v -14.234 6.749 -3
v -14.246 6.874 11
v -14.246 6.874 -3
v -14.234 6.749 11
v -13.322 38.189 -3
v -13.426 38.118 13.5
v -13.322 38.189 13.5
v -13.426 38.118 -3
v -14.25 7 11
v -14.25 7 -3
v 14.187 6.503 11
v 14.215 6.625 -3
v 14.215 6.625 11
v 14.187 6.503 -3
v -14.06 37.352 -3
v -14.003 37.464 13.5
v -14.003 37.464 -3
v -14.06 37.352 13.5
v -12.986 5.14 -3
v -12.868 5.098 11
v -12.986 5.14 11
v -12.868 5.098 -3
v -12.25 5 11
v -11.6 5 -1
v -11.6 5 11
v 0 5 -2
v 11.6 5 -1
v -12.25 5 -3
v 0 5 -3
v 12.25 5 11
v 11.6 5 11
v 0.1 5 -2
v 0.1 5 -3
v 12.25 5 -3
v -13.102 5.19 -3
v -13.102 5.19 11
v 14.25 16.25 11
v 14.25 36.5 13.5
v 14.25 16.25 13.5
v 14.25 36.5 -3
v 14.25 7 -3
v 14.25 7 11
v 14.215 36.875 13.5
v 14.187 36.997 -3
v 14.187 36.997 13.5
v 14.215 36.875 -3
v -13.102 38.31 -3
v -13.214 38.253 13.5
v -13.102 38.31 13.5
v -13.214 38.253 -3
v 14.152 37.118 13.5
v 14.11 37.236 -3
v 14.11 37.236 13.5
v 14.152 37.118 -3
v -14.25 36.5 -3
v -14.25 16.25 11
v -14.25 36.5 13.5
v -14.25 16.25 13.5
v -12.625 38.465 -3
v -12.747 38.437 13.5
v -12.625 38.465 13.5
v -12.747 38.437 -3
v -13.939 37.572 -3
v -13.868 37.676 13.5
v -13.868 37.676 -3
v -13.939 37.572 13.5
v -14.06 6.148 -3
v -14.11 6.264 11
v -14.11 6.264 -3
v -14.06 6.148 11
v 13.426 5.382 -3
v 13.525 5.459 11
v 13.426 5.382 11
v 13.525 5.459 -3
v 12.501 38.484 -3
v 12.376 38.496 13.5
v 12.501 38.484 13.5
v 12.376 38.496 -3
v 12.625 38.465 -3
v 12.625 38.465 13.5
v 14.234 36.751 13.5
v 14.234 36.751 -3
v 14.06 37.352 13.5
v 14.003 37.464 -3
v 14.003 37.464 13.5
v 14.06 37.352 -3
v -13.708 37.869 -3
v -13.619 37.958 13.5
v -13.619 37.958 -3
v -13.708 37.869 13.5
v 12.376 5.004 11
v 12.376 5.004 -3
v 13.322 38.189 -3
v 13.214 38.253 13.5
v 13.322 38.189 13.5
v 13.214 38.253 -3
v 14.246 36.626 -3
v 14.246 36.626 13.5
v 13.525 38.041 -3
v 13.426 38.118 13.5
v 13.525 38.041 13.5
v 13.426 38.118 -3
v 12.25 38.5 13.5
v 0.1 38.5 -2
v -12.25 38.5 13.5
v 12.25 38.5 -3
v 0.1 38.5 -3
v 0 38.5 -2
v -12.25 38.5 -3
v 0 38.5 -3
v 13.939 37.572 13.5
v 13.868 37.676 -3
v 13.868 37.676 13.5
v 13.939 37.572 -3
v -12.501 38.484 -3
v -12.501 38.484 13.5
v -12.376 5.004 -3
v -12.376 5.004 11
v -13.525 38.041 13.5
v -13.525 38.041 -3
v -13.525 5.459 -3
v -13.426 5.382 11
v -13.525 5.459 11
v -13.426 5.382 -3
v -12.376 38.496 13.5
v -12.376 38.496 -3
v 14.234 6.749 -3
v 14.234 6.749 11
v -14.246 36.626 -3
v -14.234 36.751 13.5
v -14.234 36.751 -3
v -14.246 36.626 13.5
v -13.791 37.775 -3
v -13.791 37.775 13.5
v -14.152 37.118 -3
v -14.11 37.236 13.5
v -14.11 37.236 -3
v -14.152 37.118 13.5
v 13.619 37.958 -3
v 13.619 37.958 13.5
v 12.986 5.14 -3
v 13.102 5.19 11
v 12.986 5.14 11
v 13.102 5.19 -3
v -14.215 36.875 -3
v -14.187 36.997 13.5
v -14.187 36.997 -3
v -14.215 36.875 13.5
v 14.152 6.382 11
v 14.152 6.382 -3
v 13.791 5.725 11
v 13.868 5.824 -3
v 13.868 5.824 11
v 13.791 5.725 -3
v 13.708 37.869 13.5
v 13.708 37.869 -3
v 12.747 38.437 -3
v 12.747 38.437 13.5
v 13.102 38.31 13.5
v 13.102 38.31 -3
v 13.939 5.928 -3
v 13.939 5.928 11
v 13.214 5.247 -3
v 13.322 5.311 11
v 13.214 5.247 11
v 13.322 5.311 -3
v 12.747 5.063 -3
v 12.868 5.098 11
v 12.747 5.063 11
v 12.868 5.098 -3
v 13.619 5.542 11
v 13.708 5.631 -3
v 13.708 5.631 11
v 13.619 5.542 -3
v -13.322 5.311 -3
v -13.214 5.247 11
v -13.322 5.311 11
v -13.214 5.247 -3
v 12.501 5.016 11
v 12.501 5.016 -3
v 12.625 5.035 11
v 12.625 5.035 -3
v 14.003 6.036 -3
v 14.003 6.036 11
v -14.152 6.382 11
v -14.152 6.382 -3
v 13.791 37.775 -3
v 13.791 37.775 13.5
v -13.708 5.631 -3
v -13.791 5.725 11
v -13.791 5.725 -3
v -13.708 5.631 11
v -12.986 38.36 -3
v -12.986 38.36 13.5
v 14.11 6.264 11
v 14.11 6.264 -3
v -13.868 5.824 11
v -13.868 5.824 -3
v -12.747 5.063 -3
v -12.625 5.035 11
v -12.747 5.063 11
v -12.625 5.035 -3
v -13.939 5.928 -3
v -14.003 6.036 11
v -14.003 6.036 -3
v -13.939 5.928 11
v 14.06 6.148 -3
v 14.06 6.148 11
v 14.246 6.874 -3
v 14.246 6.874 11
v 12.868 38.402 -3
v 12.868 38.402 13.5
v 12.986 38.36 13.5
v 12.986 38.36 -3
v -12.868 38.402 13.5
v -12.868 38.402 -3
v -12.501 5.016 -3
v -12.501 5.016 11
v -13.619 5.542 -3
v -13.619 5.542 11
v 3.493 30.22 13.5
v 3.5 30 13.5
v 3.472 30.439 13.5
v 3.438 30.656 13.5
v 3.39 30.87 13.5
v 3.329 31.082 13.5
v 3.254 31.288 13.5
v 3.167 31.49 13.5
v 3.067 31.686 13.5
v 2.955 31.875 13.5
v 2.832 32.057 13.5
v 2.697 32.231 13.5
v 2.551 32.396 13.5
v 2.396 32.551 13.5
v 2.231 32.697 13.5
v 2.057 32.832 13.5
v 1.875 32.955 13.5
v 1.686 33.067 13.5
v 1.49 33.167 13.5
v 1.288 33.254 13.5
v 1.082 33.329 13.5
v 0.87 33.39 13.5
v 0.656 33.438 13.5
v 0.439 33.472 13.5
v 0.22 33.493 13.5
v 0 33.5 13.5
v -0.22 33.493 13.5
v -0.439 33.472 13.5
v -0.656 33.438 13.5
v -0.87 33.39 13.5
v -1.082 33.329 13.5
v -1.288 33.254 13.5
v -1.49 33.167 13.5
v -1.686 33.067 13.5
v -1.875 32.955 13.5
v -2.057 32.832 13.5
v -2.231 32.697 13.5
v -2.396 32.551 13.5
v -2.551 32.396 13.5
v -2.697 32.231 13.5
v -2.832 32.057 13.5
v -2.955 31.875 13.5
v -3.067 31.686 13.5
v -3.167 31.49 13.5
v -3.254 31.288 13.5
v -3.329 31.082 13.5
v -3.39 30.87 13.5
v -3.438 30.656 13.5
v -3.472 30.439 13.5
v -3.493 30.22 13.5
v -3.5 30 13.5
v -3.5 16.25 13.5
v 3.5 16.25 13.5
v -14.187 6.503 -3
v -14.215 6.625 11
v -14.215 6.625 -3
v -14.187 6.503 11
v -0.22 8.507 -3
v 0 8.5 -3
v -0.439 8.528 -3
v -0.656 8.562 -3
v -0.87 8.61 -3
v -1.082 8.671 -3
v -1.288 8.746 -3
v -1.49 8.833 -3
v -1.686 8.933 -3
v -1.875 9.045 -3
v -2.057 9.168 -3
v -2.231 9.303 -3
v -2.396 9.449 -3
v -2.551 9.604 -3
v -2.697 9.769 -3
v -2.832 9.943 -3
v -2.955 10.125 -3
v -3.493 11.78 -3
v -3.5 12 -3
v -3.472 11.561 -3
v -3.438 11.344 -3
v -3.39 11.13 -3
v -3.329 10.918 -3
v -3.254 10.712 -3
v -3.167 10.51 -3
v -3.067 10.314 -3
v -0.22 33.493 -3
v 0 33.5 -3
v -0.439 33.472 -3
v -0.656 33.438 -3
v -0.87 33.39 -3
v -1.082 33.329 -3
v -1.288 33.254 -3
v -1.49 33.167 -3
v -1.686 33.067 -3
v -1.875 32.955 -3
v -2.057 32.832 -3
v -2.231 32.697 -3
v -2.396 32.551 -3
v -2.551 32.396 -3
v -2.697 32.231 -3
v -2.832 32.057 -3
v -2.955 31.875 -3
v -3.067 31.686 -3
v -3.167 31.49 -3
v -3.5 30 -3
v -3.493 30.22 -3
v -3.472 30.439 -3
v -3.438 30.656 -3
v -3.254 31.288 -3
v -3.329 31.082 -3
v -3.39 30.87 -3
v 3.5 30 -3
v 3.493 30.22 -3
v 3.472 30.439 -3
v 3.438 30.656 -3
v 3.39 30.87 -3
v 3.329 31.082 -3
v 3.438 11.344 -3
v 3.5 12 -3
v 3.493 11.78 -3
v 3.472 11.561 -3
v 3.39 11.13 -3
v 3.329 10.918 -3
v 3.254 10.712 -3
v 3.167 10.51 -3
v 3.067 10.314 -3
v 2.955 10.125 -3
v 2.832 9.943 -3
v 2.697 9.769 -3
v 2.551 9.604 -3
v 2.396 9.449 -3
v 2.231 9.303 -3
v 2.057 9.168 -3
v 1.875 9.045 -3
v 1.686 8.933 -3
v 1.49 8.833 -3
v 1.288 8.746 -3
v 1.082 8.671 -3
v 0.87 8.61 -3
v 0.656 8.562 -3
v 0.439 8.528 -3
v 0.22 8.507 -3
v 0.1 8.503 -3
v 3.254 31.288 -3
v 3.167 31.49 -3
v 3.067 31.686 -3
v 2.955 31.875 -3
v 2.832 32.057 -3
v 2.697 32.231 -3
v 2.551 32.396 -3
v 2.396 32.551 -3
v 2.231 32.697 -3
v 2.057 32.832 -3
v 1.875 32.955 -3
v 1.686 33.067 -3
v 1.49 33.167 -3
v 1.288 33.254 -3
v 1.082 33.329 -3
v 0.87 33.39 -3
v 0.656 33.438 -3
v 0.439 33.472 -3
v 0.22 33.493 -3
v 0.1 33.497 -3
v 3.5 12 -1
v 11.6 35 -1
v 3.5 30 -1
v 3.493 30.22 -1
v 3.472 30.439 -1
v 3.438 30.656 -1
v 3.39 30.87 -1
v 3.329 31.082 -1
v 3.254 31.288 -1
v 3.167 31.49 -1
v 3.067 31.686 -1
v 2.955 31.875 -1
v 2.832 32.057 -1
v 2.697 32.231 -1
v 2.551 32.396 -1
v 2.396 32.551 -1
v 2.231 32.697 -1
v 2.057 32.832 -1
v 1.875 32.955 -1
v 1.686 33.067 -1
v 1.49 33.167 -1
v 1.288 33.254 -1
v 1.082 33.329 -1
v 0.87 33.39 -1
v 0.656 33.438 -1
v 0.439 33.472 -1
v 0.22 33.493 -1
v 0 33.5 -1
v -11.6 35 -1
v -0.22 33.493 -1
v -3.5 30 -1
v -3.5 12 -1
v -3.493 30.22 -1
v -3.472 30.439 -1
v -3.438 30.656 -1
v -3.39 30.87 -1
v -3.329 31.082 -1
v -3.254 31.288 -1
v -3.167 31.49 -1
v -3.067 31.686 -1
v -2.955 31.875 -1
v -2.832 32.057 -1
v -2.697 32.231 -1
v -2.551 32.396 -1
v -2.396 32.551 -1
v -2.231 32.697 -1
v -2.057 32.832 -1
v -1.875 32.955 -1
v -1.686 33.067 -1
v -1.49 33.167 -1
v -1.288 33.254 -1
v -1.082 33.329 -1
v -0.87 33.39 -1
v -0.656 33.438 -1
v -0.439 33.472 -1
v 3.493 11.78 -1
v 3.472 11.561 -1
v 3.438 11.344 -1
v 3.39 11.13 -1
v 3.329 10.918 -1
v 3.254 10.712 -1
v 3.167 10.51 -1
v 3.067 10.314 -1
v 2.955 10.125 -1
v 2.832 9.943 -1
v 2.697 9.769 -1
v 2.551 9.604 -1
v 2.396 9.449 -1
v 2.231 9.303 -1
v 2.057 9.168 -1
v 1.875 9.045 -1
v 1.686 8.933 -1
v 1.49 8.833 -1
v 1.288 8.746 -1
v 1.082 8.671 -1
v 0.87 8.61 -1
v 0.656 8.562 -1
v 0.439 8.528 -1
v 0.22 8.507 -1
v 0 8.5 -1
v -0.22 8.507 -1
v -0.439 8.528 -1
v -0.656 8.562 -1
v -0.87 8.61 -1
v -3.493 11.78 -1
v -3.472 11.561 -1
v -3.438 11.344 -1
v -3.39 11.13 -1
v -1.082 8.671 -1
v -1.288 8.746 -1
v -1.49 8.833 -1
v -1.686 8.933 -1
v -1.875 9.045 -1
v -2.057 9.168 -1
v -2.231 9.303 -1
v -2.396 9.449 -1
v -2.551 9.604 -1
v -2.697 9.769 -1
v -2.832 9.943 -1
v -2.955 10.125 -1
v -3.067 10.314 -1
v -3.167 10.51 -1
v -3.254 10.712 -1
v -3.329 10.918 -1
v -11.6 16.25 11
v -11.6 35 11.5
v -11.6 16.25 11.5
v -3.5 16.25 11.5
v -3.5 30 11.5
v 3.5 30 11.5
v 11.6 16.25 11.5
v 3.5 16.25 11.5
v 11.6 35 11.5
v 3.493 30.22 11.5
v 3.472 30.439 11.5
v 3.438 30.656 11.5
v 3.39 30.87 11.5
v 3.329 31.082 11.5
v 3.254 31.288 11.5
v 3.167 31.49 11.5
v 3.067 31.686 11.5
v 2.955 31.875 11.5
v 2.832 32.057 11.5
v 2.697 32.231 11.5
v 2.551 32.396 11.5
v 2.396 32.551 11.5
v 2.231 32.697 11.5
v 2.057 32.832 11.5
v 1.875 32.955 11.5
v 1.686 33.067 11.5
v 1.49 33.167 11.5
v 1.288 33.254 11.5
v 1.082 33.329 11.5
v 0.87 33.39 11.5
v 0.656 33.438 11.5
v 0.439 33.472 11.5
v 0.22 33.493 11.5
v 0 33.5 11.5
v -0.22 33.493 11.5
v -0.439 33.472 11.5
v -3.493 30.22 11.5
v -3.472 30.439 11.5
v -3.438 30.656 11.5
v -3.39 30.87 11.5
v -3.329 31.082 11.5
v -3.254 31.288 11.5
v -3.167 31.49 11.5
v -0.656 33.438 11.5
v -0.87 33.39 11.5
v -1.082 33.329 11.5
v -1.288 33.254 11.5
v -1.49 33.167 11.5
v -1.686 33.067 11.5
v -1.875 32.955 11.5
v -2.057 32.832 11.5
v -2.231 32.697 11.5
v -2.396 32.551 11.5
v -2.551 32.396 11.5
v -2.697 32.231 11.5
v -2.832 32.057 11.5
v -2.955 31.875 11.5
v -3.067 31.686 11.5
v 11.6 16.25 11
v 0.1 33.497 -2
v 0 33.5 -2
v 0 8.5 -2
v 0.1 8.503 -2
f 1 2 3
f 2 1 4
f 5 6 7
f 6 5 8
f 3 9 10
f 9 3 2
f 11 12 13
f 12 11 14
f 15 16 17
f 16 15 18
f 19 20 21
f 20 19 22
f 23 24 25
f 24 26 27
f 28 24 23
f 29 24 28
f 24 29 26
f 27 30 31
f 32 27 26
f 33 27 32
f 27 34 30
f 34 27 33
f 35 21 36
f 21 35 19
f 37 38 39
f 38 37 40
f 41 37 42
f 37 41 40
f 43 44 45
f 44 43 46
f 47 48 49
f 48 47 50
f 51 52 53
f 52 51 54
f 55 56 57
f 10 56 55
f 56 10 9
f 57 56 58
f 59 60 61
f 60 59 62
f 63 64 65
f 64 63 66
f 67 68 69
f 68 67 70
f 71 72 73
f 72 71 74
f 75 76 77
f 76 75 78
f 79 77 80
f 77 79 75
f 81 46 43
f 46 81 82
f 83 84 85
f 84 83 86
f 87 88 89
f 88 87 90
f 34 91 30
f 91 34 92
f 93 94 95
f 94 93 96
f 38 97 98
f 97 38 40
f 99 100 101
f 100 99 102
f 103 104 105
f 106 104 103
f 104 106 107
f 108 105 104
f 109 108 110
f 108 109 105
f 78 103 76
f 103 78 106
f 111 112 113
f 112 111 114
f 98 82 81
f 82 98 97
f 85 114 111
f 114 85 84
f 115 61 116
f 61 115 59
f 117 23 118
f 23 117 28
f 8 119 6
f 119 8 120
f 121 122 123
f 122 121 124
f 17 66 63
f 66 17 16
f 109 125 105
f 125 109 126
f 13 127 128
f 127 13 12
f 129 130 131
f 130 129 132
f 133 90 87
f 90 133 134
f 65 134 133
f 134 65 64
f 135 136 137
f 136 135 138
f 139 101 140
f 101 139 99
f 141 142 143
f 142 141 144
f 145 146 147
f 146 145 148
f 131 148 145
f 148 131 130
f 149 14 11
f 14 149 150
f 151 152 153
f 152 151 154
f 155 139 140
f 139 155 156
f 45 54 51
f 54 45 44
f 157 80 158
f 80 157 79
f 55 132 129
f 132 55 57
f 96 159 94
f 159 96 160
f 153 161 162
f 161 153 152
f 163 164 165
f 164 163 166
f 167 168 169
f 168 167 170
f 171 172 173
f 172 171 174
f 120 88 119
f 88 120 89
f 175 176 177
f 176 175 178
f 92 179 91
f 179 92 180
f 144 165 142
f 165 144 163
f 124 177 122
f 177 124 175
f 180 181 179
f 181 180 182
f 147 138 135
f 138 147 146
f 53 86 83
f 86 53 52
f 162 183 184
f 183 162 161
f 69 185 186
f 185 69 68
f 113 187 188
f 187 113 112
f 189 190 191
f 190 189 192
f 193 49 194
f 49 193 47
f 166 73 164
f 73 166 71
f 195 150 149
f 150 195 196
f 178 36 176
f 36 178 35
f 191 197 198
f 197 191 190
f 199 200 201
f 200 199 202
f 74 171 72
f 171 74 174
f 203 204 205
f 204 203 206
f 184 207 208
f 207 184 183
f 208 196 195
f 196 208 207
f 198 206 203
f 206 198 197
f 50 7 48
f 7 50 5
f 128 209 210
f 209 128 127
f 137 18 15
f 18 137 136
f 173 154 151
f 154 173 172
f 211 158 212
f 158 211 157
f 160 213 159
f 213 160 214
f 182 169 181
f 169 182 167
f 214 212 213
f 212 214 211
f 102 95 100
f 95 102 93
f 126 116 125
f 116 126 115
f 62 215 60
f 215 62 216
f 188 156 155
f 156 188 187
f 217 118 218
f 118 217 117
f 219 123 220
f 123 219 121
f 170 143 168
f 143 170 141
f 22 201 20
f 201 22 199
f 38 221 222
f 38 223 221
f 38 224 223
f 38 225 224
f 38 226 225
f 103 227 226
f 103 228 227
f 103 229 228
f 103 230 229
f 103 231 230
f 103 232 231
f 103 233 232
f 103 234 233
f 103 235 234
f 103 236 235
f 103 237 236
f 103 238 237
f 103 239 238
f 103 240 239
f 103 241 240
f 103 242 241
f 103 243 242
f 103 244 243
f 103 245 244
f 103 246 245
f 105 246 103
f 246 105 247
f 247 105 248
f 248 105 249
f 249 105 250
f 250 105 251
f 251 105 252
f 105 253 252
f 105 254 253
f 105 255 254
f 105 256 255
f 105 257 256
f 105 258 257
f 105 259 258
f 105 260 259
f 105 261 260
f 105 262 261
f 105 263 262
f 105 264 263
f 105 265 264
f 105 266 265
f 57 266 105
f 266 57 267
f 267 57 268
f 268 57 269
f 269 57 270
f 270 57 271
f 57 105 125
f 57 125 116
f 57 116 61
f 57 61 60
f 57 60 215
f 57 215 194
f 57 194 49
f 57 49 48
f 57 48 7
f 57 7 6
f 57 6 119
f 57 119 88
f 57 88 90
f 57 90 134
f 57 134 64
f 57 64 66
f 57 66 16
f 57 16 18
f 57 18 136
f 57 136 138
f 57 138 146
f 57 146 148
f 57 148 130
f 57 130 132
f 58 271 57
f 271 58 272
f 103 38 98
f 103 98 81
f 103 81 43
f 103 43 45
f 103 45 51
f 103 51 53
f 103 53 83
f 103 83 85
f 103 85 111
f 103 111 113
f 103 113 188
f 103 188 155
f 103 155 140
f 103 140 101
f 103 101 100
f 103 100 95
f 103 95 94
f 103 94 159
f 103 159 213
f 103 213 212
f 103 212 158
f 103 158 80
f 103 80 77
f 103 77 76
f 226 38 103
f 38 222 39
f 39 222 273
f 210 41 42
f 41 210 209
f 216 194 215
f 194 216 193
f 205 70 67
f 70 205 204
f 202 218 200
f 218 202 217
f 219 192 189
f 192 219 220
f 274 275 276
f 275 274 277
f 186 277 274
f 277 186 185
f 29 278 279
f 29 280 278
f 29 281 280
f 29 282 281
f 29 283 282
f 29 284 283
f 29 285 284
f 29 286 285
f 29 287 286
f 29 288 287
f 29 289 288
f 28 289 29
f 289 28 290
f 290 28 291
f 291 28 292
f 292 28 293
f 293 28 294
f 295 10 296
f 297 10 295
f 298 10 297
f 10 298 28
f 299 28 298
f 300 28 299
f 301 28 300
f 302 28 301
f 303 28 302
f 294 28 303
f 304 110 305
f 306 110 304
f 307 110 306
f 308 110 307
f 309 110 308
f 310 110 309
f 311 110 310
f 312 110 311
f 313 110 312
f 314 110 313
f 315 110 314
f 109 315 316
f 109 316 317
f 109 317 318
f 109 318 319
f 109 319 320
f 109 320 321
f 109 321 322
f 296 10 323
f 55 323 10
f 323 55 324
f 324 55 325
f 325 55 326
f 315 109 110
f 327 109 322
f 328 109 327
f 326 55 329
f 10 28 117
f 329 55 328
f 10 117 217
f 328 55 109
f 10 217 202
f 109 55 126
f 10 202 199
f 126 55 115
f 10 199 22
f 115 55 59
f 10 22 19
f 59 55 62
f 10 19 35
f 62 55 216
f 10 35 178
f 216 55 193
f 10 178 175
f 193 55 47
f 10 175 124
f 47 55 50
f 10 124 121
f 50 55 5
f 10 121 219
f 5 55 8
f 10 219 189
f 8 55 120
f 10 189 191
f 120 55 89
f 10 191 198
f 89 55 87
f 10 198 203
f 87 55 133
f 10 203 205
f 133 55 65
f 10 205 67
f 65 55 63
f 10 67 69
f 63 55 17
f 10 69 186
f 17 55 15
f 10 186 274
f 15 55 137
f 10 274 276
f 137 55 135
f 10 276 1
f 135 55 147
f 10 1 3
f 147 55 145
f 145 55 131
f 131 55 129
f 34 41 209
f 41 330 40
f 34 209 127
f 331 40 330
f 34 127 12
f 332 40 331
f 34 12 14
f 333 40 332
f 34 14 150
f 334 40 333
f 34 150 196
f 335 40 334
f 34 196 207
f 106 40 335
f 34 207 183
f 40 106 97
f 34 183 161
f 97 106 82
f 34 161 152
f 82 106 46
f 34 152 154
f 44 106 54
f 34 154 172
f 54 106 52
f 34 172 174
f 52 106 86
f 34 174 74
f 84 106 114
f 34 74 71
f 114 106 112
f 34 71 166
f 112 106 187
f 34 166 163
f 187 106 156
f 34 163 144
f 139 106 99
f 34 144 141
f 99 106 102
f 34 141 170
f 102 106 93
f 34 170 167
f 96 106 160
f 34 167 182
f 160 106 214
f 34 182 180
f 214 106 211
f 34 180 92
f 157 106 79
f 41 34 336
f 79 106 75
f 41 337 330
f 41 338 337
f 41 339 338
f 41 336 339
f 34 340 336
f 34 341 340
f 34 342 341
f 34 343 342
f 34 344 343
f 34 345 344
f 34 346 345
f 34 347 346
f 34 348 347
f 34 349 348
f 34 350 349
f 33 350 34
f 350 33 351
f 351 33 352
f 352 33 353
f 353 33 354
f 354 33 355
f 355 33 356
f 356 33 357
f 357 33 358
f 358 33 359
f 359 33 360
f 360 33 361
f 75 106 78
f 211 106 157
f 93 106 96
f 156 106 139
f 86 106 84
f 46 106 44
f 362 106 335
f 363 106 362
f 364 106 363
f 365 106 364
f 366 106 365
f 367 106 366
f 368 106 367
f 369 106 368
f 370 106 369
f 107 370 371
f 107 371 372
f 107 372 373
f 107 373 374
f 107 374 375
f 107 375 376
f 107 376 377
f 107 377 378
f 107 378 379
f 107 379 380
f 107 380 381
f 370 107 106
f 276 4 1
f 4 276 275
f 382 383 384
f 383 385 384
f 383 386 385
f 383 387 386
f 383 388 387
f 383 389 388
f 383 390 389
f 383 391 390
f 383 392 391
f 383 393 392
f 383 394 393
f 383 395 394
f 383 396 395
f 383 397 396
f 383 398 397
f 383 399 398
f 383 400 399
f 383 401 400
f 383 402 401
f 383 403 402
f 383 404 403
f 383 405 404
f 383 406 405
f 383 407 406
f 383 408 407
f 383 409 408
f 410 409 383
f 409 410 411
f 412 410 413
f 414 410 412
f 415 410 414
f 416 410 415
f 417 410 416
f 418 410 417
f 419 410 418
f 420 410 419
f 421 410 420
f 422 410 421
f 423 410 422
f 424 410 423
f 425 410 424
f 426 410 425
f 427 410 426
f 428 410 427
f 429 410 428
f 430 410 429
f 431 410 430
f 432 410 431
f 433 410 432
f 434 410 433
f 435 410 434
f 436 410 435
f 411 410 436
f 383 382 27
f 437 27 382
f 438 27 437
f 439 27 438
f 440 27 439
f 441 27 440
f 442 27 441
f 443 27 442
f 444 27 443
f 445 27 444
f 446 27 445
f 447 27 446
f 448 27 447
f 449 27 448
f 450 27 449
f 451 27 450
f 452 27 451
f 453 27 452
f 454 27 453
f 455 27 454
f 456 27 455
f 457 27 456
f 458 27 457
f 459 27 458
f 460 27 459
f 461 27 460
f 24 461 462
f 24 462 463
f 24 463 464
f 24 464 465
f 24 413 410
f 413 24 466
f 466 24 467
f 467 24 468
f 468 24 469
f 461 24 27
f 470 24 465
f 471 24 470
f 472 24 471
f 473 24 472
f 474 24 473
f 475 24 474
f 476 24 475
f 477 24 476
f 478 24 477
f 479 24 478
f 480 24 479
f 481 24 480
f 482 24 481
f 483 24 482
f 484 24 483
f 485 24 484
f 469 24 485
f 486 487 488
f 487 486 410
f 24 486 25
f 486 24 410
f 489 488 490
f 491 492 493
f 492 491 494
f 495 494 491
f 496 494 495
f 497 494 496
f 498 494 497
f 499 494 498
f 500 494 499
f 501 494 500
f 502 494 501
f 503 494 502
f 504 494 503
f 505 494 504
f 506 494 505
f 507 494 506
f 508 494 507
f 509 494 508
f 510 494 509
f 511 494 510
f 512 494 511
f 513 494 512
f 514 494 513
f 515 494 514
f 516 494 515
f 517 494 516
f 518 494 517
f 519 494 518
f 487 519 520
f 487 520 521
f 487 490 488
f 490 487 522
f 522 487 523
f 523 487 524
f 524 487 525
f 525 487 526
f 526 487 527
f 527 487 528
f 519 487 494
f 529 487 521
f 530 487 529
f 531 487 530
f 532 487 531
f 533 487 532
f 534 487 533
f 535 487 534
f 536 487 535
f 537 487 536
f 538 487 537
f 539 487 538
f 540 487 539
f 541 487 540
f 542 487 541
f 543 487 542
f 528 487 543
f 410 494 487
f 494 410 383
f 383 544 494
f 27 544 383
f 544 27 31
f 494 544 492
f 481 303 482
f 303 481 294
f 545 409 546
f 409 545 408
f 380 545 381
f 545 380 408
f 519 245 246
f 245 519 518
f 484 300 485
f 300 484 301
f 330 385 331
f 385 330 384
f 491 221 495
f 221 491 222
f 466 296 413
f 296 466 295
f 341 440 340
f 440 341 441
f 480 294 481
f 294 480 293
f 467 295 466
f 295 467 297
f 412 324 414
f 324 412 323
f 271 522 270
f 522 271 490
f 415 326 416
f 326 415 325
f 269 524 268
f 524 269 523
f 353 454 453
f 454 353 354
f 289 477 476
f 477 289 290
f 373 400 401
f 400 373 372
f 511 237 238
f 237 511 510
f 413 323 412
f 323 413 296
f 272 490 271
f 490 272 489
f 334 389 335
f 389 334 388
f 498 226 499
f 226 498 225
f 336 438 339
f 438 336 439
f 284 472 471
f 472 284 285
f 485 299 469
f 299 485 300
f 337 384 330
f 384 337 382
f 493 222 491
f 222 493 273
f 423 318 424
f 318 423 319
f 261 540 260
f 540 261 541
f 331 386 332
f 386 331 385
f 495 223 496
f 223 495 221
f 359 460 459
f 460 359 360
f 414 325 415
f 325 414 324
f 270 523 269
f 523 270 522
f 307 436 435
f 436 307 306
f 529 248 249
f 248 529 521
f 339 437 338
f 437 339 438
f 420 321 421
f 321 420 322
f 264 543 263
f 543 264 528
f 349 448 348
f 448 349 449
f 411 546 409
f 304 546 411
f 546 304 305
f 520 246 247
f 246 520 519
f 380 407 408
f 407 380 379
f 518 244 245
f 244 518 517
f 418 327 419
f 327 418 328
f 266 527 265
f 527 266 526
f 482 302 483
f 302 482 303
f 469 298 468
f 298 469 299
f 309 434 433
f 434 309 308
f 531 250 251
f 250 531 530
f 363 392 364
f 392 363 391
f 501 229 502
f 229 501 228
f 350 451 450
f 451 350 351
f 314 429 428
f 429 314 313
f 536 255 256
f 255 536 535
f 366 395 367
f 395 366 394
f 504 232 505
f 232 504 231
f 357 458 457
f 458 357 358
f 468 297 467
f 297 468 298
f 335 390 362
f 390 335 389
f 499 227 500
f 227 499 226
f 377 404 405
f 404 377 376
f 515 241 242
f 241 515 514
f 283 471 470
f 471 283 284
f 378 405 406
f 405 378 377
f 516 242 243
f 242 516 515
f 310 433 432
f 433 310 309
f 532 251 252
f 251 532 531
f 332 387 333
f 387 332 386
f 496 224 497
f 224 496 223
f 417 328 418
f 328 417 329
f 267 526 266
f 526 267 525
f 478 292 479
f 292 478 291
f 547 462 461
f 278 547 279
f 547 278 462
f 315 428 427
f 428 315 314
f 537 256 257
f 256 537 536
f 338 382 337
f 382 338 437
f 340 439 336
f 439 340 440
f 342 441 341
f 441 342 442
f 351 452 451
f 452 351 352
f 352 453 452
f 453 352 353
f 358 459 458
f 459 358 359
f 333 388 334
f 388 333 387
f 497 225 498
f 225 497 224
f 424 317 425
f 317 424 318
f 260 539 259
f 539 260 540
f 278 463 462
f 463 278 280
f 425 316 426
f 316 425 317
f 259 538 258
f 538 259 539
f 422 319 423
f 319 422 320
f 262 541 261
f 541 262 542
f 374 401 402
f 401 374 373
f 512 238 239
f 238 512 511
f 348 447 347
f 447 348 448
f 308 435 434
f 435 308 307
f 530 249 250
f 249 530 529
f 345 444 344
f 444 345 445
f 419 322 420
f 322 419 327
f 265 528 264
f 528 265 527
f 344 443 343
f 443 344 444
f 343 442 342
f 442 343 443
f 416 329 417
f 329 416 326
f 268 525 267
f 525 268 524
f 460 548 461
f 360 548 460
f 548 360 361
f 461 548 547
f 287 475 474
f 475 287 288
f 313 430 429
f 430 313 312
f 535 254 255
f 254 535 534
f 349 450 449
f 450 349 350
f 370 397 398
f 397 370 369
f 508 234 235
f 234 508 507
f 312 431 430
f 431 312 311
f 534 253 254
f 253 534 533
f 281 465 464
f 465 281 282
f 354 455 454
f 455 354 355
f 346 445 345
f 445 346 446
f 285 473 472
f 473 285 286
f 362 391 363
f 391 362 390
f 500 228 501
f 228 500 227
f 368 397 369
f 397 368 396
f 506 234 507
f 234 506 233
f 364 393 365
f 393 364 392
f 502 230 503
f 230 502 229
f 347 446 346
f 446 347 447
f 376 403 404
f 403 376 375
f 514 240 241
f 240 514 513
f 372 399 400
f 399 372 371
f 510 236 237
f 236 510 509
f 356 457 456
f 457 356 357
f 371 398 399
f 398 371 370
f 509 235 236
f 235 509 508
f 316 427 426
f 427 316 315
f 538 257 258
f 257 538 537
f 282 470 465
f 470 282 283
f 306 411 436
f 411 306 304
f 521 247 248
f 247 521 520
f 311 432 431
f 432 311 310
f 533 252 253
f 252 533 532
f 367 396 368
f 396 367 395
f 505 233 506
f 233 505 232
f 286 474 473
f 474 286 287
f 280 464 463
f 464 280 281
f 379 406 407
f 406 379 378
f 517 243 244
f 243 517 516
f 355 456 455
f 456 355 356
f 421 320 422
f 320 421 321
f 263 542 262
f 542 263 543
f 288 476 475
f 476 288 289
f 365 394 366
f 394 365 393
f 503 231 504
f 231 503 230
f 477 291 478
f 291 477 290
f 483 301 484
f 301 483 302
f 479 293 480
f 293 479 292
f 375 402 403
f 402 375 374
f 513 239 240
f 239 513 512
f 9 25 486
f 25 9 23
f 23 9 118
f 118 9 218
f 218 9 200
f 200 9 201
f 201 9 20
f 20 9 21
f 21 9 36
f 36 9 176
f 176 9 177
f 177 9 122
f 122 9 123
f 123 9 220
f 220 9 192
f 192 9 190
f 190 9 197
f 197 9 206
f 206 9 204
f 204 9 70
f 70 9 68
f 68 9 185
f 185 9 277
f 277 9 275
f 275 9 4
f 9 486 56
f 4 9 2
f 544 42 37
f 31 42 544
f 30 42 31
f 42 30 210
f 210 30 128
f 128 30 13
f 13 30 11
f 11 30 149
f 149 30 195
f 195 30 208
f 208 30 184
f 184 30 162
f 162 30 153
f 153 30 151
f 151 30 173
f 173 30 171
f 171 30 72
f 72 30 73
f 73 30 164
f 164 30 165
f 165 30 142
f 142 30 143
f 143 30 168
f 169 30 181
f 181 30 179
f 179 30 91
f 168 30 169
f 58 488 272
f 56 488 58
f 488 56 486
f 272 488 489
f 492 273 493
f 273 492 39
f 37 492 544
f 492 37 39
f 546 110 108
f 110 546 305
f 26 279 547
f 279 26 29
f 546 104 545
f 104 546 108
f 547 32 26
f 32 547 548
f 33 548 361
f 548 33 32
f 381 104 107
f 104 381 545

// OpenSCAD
color ([1.0,0,0,0.5])difference() {
    // ベース
    translate([0,0,-3]) linear_extrude(16.5) {
        translate([-14.25,5,0]) {
            hull(){
                translate([26.5,2]) circle(2,$fn=100);
                translate([26.5,31.5]) circle(2,$fn=100);
                translate([2,31.5]) circle(2,$fn=100);
                translate([2,2]) circle(2,$fn=100);
            }
        }
    }
    // 中の空洞
    translate([0,1,-1]) linear_extrude(12.5)  {
        square([23.2,68],center=true);
        
    }
    // 穴
    translate([0,0,-3]) linear_extrude(20) {
        hull(){
            translate([0,30,0]) circle(3.5,$fn=100);
            translate([0,12,0]) circle(3.5,$fn=100);
        }
    }
    // 上カバーの欠け
    translate([0,0,11]) linear_extrude(3) square([30,32.5],center=true);
    // 穴の強化
    translate([0,0,-3]) linear_extrude(1) square([0.1,100]);
}
//*/
// 鍵
/*
translate([0,0,0]) difference(){
    color("gold") linear_extrude(12)  square([24,68],center=true);
    translate([0,30,0]) linear_extrude(12) circle(3);
}
//*/
